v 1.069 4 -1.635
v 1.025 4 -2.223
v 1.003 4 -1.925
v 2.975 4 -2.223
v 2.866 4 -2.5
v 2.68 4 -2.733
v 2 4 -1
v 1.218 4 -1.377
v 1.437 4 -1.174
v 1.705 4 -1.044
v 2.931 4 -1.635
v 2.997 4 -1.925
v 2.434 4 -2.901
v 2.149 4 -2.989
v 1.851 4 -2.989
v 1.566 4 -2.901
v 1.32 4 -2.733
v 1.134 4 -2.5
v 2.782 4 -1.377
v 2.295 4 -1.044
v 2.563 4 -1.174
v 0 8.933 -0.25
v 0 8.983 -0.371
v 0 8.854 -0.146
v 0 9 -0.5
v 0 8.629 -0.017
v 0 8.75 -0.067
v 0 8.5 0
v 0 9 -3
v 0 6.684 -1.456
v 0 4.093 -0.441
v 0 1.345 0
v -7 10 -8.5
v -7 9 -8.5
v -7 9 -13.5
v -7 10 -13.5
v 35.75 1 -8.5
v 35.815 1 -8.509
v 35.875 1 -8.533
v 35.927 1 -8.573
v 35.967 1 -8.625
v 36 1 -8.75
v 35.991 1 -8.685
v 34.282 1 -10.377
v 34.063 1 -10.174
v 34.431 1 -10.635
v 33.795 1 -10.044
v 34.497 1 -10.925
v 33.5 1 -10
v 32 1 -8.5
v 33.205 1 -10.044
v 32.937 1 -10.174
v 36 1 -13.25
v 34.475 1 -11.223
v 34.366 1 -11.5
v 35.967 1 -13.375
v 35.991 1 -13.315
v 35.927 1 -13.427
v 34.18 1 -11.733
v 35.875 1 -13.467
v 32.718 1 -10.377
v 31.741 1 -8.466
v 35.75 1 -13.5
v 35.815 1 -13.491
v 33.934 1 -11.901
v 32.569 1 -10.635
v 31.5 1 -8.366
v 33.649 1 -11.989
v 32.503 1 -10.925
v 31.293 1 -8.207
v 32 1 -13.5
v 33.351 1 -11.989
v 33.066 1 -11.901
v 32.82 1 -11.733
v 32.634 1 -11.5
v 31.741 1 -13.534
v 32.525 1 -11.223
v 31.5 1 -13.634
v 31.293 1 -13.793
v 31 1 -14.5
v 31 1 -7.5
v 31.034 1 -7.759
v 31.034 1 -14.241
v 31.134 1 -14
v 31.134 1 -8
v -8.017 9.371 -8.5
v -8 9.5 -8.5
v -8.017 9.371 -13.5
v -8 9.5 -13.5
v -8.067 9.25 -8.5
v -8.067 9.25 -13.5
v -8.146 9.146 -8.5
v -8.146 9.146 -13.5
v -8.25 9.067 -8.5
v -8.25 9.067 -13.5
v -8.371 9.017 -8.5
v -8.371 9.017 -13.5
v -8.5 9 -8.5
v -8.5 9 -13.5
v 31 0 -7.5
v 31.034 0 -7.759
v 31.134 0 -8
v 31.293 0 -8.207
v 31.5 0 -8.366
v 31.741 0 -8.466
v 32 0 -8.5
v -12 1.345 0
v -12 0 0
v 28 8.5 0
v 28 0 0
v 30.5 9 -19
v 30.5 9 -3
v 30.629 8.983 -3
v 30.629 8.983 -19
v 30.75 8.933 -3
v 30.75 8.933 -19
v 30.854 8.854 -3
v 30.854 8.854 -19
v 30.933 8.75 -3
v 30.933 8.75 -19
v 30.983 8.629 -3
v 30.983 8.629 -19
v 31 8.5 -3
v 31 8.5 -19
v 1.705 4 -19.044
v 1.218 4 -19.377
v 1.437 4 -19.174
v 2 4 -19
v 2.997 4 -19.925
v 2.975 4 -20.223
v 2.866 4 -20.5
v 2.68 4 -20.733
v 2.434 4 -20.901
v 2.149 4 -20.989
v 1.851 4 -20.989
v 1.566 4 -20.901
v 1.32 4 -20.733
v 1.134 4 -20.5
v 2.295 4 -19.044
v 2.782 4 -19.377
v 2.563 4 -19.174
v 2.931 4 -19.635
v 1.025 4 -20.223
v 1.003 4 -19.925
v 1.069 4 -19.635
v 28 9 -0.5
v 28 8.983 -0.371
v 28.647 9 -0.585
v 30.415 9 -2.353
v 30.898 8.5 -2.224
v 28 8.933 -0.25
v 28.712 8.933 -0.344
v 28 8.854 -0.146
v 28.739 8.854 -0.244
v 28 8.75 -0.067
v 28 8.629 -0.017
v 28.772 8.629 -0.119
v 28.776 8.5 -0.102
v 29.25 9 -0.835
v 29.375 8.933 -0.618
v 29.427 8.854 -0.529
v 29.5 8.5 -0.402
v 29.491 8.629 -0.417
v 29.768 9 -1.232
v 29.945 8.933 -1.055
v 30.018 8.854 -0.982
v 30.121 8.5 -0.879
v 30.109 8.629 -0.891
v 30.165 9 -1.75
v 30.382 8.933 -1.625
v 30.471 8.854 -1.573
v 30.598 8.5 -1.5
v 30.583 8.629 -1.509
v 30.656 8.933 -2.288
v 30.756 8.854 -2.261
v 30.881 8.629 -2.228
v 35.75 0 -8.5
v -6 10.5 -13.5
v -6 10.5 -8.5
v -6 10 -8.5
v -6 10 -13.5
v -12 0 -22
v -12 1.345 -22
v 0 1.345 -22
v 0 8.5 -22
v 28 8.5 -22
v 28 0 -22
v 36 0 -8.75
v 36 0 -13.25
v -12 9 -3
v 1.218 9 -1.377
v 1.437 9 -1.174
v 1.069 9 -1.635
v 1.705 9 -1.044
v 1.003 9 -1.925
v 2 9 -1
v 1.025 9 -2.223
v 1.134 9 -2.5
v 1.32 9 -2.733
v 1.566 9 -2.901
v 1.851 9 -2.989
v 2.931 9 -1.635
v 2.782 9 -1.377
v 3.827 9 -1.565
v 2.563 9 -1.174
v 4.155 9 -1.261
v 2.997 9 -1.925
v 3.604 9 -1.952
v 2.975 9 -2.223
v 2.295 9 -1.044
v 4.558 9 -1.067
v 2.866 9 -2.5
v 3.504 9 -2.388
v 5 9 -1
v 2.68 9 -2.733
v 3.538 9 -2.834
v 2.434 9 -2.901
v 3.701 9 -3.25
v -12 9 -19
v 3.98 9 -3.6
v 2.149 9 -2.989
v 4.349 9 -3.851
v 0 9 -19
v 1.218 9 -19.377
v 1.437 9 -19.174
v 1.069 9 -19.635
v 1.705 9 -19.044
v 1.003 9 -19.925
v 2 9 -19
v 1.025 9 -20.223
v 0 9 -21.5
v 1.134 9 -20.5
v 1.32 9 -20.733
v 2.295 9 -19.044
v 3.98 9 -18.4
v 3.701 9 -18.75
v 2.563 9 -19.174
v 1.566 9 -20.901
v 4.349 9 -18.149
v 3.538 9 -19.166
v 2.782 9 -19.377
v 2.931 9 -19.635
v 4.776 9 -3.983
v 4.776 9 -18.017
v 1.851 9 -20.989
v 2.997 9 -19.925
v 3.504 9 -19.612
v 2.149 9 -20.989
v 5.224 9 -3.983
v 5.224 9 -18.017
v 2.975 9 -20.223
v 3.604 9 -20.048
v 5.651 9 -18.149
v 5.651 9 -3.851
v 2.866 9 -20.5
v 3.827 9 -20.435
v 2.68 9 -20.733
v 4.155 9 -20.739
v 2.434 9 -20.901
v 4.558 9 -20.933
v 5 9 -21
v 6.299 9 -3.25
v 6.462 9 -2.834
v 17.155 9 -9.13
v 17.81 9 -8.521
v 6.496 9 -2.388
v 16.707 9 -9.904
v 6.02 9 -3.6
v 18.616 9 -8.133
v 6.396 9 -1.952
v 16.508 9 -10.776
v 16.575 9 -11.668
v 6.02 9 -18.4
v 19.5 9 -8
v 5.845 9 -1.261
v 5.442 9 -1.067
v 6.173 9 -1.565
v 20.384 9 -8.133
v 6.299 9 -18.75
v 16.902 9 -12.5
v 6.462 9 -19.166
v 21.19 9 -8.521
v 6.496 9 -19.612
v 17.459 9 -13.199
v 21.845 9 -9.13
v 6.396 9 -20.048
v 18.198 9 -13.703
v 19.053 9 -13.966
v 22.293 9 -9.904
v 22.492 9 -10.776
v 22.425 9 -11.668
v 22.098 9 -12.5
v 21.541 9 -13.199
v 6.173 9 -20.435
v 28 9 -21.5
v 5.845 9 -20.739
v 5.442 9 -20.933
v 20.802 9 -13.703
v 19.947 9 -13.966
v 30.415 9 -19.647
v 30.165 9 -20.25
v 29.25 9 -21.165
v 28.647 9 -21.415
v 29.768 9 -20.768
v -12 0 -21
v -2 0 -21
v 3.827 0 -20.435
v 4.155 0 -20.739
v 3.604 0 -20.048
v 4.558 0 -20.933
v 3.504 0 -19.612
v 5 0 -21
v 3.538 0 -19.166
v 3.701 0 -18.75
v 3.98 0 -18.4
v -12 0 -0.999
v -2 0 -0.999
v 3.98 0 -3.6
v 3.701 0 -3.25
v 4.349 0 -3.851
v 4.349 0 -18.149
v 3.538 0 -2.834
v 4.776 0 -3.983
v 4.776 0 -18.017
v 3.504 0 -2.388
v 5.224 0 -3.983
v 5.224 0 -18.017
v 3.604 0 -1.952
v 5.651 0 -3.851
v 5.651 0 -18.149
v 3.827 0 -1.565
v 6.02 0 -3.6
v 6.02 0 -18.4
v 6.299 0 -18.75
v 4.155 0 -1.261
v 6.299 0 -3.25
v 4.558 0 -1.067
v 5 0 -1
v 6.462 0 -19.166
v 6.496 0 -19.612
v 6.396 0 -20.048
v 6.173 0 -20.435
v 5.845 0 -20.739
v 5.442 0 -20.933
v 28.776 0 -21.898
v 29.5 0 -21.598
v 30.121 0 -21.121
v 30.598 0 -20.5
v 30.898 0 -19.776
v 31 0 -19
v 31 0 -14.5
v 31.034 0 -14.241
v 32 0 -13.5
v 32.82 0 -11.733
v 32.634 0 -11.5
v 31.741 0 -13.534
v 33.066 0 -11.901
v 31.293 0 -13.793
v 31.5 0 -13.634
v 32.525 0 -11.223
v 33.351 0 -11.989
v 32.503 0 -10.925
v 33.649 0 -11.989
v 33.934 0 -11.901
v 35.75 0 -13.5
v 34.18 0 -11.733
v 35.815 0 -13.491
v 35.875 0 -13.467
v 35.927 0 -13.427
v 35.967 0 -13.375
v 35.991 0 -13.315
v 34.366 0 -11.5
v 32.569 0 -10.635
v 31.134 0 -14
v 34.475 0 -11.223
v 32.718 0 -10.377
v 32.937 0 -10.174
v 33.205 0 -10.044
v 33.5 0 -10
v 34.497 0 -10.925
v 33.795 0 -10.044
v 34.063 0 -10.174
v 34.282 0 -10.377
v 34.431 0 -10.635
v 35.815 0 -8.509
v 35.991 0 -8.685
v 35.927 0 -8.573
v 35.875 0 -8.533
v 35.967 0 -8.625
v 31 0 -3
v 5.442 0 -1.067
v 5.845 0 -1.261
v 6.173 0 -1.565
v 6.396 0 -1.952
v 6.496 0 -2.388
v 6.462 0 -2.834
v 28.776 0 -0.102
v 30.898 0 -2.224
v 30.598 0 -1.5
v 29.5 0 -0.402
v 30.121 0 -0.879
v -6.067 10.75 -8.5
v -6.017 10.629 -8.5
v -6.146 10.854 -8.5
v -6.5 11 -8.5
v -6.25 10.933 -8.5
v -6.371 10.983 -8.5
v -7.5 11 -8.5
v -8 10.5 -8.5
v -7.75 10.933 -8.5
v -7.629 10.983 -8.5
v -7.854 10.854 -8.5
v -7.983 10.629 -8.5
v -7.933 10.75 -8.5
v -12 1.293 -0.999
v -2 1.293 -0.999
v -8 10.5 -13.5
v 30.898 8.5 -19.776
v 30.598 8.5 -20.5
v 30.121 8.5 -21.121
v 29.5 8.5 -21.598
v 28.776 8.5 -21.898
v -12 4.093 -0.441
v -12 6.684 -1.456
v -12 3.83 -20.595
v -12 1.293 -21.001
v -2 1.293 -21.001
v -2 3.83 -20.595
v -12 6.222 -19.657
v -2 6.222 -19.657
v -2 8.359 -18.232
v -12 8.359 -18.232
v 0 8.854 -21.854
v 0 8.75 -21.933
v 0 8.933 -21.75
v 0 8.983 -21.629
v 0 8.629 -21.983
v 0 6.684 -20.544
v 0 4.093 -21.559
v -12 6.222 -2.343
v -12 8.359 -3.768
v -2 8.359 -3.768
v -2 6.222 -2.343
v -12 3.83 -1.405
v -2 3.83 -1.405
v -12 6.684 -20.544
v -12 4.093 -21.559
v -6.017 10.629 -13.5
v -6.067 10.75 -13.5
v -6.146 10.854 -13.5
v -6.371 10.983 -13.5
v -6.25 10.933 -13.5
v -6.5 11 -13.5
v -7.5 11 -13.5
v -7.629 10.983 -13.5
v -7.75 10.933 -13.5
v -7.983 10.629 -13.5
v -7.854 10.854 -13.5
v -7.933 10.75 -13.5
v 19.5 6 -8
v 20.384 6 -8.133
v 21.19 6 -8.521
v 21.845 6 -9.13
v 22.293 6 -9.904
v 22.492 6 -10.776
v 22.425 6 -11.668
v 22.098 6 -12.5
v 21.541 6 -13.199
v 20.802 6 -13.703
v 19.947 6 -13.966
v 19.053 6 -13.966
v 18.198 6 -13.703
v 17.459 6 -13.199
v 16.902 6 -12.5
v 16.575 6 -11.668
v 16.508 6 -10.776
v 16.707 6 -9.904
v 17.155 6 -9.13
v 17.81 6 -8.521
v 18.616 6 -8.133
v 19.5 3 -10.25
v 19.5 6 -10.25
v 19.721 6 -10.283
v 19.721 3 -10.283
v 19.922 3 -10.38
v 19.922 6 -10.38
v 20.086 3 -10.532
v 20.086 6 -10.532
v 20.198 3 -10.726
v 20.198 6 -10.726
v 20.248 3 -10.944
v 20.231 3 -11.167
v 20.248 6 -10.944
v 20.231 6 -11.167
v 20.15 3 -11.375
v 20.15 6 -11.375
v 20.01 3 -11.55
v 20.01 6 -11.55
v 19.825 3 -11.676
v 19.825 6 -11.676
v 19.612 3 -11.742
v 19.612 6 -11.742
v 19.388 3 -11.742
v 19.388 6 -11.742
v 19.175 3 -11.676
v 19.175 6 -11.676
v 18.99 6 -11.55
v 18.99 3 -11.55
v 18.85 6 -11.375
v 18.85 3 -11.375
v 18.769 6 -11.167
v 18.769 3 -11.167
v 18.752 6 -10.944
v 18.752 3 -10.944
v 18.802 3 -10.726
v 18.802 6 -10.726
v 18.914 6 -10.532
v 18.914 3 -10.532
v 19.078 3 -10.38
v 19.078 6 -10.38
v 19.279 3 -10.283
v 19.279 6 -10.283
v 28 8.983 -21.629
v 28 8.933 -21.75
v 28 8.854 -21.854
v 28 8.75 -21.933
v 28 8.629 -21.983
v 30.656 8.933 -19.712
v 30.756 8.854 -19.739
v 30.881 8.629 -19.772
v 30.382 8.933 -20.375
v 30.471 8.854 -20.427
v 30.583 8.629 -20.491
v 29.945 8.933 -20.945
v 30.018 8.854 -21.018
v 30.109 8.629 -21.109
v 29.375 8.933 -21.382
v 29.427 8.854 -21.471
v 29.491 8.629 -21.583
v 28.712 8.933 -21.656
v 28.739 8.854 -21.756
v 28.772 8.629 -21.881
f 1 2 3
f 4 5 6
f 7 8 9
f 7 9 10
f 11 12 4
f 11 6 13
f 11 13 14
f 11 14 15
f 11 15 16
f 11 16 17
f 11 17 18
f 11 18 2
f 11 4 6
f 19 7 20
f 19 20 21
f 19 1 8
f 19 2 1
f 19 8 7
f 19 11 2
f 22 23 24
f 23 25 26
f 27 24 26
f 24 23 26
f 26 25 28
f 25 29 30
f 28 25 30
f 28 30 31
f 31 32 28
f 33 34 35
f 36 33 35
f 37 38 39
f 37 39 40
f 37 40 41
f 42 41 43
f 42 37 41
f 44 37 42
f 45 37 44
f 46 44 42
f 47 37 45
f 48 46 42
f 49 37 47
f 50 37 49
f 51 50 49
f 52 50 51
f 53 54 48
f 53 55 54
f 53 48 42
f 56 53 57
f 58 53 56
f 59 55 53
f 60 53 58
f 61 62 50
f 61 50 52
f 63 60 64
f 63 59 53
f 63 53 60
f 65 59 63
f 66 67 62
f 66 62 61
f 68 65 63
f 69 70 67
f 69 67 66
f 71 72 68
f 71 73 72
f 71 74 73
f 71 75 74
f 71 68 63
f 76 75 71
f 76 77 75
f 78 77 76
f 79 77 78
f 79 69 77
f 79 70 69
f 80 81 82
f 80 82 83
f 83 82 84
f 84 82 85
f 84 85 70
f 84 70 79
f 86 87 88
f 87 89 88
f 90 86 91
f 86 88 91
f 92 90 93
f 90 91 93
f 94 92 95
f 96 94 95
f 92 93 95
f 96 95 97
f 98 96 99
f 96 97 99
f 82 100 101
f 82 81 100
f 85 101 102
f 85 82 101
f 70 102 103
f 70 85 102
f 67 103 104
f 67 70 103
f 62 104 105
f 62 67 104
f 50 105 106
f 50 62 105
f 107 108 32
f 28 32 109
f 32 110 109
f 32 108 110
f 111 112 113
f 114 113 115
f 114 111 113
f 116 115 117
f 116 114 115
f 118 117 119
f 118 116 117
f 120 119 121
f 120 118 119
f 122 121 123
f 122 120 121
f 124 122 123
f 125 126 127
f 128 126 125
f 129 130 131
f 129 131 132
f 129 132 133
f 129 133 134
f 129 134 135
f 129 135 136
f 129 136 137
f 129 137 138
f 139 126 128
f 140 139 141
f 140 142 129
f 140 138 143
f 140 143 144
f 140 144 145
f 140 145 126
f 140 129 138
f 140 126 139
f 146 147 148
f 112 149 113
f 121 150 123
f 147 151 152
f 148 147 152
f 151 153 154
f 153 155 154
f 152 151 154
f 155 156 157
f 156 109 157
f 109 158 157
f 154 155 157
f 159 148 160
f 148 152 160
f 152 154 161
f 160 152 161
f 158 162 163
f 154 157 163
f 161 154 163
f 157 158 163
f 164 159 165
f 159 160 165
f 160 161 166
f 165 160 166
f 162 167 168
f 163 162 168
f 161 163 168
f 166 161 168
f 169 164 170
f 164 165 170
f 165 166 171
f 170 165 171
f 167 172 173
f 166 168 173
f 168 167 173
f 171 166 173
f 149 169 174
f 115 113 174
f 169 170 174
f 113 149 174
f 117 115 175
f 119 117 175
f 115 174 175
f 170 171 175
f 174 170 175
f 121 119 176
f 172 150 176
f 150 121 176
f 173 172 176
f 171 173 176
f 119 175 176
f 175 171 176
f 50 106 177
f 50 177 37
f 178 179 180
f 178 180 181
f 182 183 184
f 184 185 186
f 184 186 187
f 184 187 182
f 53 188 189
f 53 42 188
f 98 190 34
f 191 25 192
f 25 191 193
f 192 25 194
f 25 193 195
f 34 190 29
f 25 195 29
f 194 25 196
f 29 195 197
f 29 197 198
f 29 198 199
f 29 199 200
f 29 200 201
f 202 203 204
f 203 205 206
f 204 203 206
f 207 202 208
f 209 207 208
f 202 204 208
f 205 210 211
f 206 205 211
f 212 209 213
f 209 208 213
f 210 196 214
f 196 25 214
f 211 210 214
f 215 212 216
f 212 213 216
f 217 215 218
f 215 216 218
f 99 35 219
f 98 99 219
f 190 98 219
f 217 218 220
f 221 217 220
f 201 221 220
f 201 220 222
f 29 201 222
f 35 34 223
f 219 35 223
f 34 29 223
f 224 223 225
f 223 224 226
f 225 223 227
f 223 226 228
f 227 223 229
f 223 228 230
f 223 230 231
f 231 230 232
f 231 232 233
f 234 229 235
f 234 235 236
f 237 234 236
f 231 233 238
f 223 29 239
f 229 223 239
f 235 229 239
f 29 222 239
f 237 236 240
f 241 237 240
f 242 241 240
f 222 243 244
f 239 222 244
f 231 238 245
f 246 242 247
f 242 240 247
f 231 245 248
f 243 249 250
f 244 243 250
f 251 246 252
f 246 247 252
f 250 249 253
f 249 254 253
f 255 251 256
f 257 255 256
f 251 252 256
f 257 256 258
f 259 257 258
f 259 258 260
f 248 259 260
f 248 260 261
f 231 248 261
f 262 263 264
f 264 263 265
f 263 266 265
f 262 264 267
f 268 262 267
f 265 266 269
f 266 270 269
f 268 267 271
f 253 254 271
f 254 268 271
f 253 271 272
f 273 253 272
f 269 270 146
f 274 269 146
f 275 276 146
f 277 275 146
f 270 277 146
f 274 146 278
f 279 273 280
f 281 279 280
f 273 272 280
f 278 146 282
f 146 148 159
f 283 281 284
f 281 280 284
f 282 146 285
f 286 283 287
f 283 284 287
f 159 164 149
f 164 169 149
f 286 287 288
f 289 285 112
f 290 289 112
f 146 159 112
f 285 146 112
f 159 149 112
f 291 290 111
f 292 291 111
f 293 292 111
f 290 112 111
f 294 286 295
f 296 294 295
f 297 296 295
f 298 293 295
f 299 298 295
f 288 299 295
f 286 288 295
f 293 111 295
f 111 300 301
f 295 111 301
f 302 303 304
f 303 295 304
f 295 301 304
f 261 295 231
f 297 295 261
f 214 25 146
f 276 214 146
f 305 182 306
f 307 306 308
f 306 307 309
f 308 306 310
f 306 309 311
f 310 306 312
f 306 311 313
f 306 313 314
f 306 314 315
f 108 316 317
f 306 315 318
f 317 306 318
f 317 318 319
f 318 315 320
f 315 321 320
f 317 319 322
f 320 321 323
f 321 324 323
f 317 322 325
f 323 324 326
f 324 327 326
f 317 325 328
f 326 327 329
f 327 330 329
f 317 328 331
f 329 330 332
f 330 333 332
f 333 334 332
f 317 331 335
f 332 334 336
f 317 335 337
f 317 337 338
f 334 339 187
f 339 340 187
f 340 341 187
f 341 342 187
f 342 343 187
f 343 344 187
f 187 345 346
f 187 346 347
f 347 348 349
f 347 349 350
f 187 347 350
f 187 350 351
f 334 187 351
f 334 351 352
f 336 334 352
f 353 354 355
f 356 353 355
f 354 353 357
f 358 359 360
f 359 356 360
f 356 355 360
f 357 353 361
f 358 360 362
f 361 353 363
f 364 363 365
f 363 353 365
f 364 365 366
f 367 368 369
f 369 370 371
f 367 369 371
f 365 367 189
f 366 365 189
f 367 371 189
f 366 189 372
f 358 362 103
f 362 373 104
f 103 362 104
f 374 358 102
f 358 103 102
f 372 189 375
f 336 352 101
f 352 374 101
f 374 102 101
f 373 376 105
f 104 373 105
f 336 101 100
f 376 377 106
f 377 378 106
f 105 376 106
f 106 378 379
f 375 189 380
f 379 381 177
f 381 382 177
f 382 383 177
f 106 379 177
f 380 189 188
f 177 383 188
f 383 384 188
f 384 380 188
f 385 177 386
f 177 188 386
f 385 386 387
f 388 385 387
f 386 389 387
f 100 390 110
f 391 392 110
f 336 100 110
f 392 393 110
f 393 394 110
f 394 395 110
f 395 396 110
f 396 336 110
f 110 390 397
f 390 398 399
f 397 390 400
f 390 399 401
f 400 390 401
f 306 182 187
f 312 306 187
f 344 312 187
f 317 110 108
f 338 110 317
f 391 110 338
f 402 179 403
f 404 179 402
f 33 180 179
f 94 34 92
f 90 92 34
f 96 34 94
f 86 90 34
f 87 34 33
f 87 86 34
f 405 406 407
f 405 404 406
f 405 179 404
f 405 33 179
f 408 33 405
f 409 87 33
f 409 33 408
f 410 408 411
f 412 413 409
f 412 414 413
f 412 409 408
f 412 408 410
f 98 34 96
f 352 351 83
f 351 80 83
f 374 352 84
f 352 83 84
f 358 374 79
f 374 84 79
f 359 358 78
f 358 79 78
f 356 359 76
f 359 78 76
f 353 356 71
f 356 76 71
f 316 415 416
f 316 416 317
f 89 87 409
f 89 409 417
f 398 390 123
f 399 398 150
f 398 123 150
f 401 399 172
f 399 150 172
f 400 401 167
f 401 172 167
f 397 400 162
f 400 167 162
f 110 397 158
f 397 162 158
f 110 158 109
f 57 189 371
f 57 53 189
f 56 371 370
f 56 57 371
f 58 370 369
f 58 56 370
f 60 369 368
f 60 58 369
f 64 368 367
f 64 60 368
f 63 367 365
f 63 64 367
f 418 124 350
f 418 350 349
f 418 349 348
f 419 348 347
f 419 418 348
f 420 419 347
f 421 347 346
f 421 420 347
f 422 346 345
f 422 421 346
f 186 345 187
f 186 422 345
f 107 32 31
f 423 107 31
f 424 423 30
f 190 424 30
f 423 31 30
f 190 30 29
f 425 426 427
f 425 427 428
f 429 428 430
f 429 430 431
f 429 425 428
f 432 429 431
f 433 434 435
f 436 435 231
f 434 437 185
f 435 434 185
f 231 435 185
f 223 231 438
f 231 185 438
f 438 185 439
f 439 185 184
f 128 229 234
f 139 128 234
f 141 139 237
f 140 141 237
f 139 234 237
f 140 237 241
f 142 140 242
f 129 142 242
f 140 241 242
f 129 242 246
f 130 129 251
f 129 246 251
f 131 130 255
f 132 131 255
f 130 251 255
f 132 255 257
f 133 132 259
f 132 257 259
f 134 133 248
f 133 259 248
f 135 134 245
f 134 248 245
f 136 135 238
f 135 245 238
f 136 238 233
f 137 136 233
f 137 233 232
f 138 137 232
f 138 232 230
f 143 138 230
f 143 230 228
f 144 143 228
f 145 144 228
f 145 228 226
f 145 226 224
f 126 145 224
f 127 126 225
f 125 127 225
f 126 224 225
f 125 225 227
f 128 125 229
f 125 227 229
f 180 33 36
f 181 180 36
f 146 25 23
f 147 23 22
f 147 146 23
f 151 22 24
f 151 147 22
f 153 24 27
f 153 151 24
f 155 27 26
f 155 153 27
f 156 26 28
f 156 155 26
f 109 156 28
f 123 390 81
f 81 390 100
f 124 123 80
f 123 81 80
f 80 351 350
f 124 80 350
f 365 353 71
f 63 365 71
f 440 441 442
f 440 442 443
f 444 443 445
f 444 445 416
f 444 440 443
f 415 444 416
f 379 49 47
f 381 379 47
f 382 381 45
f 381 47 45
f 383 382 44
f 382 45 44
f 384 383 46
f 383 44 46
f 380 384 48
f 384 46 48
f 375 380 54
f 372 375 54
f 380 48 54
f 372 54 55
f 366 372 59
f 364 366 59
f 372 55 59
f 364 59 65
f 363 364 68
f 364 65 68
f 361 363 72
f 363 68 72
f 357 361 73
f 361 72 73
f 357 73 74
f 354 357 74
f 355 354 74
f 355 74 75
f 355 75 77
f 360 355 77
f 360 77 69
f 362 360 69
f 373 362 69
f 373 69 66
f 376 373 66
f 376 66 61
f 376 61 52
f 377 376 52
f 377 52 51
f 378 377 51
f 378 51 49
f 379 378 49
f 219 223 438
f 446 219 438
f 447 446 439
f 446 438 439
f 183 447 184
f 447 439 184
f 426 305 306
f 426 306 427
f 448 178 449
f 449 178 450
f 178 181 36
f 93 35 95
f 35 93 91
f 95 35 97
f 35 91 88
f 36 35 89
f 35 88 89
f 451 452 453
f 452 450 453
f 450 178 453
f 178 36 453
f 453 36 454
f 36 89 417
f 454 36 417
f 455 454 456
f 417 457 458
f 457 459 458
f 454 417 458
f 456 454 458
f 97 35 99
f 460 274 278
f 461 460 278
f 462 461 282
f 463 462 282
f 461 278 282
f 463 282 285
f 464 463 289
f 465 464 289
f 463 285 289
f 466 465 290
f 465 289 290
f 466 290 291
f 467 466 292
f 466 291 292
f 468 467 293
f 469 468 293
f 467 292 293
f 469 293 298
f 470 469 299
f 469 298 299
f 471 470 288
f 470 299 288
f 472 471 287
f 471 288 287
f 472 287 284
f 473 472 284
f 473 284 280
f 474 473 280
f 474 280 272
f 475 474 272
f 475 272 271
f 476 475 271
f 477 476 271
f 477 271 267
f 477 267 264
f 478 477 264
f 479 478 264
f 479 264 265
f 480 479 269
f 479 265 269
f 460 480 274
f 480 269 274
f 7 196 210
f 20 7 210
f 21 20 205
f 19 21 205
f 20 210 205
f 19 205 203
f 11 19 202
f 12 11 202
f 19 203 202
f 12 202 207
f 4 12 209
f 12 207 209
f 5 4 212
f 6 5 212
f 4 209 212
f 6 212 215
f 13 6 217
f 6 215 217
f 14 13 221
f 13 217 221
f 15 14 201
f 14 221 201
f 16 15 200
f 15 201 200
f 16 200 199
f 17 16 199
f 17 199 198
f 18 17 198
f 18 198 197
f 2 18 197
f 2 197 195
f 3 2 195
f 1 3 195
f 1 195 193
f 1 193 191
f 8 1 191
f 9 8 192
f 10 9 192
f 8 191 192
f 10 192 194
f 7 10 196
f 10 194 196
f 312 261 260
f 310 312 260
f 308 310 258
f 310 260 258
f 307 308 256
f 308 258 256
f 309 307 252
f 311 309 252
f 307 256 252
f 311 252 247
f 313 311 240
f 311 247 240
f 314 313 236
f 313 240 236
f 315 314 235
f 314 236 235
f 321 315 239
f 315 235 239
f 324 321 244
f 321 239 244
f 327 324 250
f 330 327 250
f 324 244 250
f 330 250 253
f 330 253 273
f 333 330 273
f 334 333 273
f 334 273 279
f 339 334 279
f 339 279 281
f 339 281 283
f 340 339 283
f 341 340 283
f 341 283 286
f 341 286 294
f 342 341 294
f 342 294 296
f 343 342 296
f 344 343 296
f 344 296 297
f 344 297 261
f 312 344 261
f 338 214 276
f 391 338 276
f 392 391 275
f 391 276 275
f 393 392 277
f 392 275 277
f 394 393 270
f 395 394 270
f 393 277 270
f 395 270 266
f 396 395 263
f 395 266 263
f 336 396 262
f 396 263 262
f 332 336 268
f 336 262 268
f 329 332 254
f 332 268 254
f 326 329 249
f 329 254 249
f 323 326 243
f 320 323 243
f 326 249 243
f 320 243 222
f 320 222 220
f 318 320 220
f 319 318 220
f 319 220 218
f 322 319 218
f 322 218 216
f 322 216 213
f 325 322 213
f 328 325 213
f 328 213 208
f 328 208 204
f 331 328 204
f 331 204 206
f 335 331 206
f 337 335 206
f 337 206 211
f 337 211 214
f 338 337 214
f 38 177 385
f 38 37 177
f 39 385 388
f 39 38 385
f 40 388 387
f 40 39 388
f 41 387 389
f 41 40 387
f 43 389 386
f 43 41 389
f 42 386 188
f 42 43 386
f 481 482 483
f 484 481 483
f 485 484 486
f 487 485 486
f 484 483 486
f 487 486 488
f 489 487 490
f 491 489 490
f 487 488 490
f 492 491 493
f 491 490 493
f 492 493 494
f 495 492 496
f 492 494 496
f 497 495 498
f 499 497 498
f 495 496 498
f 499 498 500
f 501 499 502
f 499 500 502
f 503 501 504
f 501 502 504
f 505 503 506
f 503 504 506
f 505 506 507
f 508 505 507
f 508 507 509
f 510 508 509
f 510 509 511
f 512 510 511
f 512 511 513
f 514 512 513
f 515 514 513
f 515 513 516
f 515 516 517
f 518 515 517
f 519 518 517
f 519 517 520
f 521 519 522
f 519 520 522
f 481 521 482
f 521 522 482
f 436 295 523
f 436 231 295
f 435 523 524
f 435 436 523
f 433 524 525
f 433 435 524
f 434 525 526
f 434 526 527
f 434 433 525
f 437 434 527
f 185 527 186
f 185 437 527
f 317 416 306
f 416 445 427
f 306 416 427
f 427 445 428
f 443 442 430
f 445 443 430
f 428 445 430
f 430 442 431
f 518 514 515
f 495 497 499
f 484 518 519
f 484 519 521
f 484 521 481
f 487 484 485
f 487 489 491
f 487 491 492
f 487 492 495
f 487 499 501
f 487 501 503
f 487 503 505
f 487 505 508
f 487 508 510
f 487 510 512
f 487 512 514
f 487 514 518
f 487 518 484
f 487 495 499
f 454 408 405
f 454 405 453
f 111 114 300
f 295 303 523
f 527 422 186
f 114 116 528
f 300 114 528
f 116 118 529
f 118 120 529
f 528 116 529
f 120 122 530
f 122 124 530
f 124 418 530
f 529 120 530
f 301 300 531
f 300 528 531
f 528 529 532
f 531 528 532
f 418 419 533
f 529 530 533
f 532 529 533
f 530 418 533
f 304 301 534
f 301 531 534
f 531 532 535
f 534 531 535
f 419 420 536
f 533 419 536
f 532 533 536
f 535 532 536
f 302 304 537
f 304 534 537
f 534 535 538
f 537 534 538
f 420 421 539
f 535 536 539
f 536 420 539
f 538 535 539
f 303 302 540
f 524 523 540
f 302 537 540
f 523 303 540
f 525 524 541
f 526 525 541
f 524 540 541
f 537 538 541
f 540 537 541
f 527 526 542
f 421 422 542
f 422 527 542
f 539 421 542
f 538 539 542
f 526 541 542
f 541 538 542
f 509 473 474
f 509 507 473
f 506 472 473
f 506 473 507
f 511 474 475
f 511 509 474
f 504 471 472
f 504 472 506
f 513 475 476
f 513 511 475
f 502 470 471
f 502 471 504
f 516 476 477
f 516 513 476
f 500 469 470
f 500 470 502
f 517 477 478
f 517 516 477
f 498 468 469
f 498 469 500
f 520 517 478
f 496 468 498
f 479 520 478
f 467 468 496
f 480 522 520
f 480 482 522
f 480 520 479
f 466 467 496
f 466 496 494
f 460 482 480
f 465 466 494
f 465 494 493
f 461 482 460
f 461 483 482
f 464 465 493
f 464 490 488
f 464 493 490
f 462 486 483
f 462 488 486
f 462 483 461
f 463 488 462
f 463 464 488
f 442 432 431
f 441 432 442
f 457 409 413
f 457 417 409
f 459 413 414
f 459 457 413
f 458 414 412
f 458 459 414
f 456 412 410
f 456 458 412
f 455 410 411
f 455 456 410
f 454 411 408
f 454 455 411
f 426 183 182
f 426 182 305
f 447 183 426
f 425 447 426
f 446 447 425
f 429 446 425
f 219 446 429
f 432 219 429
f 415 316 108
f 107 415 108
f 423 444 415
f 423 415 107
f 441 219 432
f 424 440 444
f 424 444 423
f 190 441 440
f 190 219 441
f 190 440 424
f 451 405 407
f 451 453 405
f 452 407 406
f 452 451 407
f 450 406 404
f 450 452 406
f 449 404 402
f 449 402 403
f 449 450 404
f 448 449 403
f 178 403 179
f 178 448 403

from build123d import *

# Parameters (mm, degrees)
BOSS_EXTRUDE2_DEPTH = 9
SKETCH4_W           = 5
SKETCH4_H           = 1
BOSS_EXTRUDE3_DEPTH = 5
SKETCH5_R           = 1
CUT_EXTRUDE1_DEPTH  = 5
FILLET1_R           = 1
FILLET2_R           = 1
FILLET3_R           = 3
FILLET4_R           = 3
BOSS_EXTRUDE4_DEPTH = 12
FILLET5_R           = 0.5
FILLET6_R           = 0.25
SKETCH8_R           = 3
CUT_EXTRUDE3_DEPTH  = 3
SKETCH9_R           = 0.75
CUT_EXTRUDE4_DEPTH  = 3
SKETCH10_R          = 1.5
CUT_EXTRUDE7_DEPTH  = 44.13930922
SKETCH12_R          = 1
CUT_EXTRUDE8_DEPTH  = 5
SKETCH13_W          = 1
SKETCH13_H          = 5
BOSS_EXTRUDE5_DEPTH = 2
SKETCH14_W          = 5
SKETCH14_H          = 1
BOSS_EXTRUDE6_DEPTH = 1
FILLET7_R           = 0.5
FILLET8_R           = 0.5
FILLET9_R           = 0.5
CUT_EXTRUDE9_DEPTH  = 10


with BuildPart() as part:
    # Sketch2 → Boss-Extrude2 (new body)
    with BuildSketch(Plane(origin=(0, 0, 0), x_dir=(1, 0, 0), z_dir=(0, 1, 0))):
        Polygon((0, 11), (31, 11), (31, 13.5), (31, 22), (0, 22), align=None)
        Polygon((31, 8.5), (31, 11), (0, 11), (0, 0), (31, 0), align=None)
    extrude(amount=BOSS_EXTRUDE2_DEPTH)

    # Sketch4 → Boss-Extrude3 (add)
    with BuildSketch(Plane(origin=(31, 0, 0), x_dir=(0, 0, -1), z_dir=(1, 0, 0))):
        with Locations((11, 0.5)):
            Rectangle(SKETCH4_W, SKETCH4_H)
    extrude(amount=BOSS_EXTRUDE3_DEPTH)

    # Sketch5 → Cut-Extrude1 (cut)
    with BuildSketch(Plane(origin=(0, 1, 0), x_dir=(1, 0, 0), z_dir=(0, 1, 0))):
        with Locations(Location((33.5, 11, 0), (0, 0, 270))):
            Circle(SKETCH5_R)
    extrude(amount=-CUT_EXTRUDE1_DEPTH, mode=Mode.SUBTRACT)

    # Fillet1
    fillet1_edges = [part.edges().sort_by_distance(p)[0] for p in [
        (31, 0.5, -8.5),
    ]]
    fillet(fillet1_edges, radius=FILLET1_R)

    # Fillet2
    fillet2_edges = [part.edges().sort_by_distance(p)[0] for p in [
        (31, 0.5, -13.5),
    ]]
    fillet(fillet2_edges, radius=FILLET2_R)

    # Fillet3
    fillet3_edges = [part.edges().sort_by_distance(p)[0] for p in [
        (31, 4.5, 0),
    ]]
    fillet(fillet3_edges, radius=FILLET3_R)

    # Fillet4
    fillet4_edges = [part.edges().sort_by_distance(p)[0] for p in [
        (31, 4.5, -22),
    ]]
    fillet(fillet4_edges, radius=FILLET4_R)

    # Sketch6 → Boss-Extrude4 (add)
    with BuildSketch(Plane.ZY):
        with BuildLine():
            Line((-22, 0), (-11, 0))
            Line((-11, 0), (-11, 9))
            Line((-11, 9), (-19, 9))
            ThreePointArc((-19, 9), (-21.121122912, 5.415884648), (-22, 1.344936316))
            Line((-22, 1.344936316), (-22, 0))
        make_face()
        with BuildLine():
            Line((-11, 9), (-11, 0))
            Line((-11, 0), (0, 0))
            Line((0, 0), (0, 1.344936316))
            ThreePointArc((0, 1.344936316), (-0.878877088, 5.415884648), (-3, 9))
            Line((-3, 9), (-11, 9))
        make_face()
    extrude(amount=BOSS_EXTRUDE4_DEPTH)

    # Fillet5
    fillet5_edges = [part.edges().sort_by_distance(p)[0] for p in [
        (14, 9, -22),
        (30.121320344, 9, -21.121320344),
        (31, 9, -11),
        (30.121320344, 9, -0.878679656),
        (14, 9, 0),
    ]]
    fillet(fillet5_edges, radius=FILLET5_R)

    # Fillet6
    fillet6_edges = [part.edges().sort_by_distance(p)[0] for p in [
        (36, 0.5, -13.5),
        (36, 0.5, -8.5),
    ]]
    fillet(fillet6_edges, radius=FILLET6_R)

    # Sketch8 → Cut-Extrude3 (cut)
    with BuildSketch(Plane(origin=(0, 9, 0), x_dir=(1, 0, 0), z_dir=(0, 1, 0))):
        with Locations(Location((19.5, 11, 0), (0, 0, 270))):
            Circle(SKETCH8_R)
    extrude(amount=-CUT_EXTRUDE3_DEPTH, mode=Mode.SUBTRACT)

    # Sketch9 → Cut-Extrude4 (cut)
    with BuildSketch(Plane(origin=(0, 6, 0), x_dir=(1, 0, 0), z_dir=(0, 1, 0))):
        with Locations(Location((19.5, 11, 0), (0, 0, 270))):
            Circle(SKETCH9_R)
    extrude(amount=-CUT_EXTRUDE4_DEPTH, mode=Mode.SUBTRACT)

    # Sketch10 → Cut-Extrude7 (cut, through all)
    with BuildSketch(Plane(origin=(0, 9, 0), x_dir=(1, 0, 0), z_dir=(0, 1, 0))):
        with Locations(Location((5, 19.5, 0), (0, 0, 90))):
            Circle(SKETCH10_R)
        with Locations(Location((5, 2.5, 0), (0, 0, 270))):
            Circle(SKETCH10_R)
    extrude(amount=-CUT_EXTRUDE7_DEPTH, mode=Mode.SUBTRACT)

    # Sketch12 → Cut-Extrude8 (cut)
    with BuildSketch(Plane(origin=(0, 9, 0), x_dir=(1, 0, 0), z_dir=(0, 1, 0))):
        with Locations(Location((2, 2, 0), (0, 0, 270))):
            Circle(SKETCH12_R)
        with Locations(Location((2, 20, 0), (0, 0, 270))):
            Circle(SKETCH12_R)
    extrude(amount=-CUT_EXTRUDE8_DEPTH, mode=Mode.SUBTRACT)

    # Sketch13 → Boss-Extrude5 (add)
    with BuildSketch(Plane(origin=(0, 9, 0), x_dir=(1, 0, 0), z_dir=(0, 1, 0))):
        with Locations((-7.5, 11)):
            Rectangle(SKETCH13_W, SKETCH13_H)
    extrude(amount=BOSS_EXTRUDE5_DEPTH)

    # Sketch14 → Boss-Extrude6 (add)
    with BuildSketch(Plane(origin=(-7, 0, 0), x_dir=(0, 0, -1), z_dir=(1, 0, 0))):
        with Locations((11, 10.5)):
            Rectangle(SKETCH14_W, SKETCH14_H)
    extrude(amount=BOSS_EXTRUDE6_DEPTH)

    # Fillet7
    fillet7_edges = [part.edges().sort_by_distance(p)[0] for p in [
        (-8, 11, -11),
    ]]
    fillet(fillet7_edges, radius=FILLET7_R)

    # Fillet8
    fillet8_edges = [part.edges().sort_by_distance(p)[0] for p in [
        (-8, 9, -11),
    ]]
    fillet(fillet8_edges, radius=FILLET8_R)

    # Fillet9
    fillet9_edges = [part.edges().sort_by_distance(p)[0] for p in [
        (-6, 11, -11),
    ]]
    fillet(fillet9_edges, radius=FILLET9_R)

    # Sketch16 → Cut-Extrude9 (cut)
    with BuildSketch(Plane.ZY.offset(12)):
        with BuildLine():
            Line((-18.232108037, 8.359420628), (-3.767891963, 8.359420628))
            ThreePointArc((-3.767891963, 8.359420628), (-1.809932353, 5.051006457), (-0.998661194, 1.293207997))
            Line((-0.998661194, 1.293207997), (-0.998661194, 0))
            Line((-0.998661194, 0), (-21, 0))
            Line((-21, 0), (-21.001338806, 1.293207997))
            ThreePointArc((-21.001338806, 1.293207997), (-20.190067647, 5.051006457), (-18.232108037, 8.359420628))
        make_face()
    extrude(amount=-CUT_EXTRUDE9_DEPTH, mode=Mode.SUBTRACT)


solid = part.part
